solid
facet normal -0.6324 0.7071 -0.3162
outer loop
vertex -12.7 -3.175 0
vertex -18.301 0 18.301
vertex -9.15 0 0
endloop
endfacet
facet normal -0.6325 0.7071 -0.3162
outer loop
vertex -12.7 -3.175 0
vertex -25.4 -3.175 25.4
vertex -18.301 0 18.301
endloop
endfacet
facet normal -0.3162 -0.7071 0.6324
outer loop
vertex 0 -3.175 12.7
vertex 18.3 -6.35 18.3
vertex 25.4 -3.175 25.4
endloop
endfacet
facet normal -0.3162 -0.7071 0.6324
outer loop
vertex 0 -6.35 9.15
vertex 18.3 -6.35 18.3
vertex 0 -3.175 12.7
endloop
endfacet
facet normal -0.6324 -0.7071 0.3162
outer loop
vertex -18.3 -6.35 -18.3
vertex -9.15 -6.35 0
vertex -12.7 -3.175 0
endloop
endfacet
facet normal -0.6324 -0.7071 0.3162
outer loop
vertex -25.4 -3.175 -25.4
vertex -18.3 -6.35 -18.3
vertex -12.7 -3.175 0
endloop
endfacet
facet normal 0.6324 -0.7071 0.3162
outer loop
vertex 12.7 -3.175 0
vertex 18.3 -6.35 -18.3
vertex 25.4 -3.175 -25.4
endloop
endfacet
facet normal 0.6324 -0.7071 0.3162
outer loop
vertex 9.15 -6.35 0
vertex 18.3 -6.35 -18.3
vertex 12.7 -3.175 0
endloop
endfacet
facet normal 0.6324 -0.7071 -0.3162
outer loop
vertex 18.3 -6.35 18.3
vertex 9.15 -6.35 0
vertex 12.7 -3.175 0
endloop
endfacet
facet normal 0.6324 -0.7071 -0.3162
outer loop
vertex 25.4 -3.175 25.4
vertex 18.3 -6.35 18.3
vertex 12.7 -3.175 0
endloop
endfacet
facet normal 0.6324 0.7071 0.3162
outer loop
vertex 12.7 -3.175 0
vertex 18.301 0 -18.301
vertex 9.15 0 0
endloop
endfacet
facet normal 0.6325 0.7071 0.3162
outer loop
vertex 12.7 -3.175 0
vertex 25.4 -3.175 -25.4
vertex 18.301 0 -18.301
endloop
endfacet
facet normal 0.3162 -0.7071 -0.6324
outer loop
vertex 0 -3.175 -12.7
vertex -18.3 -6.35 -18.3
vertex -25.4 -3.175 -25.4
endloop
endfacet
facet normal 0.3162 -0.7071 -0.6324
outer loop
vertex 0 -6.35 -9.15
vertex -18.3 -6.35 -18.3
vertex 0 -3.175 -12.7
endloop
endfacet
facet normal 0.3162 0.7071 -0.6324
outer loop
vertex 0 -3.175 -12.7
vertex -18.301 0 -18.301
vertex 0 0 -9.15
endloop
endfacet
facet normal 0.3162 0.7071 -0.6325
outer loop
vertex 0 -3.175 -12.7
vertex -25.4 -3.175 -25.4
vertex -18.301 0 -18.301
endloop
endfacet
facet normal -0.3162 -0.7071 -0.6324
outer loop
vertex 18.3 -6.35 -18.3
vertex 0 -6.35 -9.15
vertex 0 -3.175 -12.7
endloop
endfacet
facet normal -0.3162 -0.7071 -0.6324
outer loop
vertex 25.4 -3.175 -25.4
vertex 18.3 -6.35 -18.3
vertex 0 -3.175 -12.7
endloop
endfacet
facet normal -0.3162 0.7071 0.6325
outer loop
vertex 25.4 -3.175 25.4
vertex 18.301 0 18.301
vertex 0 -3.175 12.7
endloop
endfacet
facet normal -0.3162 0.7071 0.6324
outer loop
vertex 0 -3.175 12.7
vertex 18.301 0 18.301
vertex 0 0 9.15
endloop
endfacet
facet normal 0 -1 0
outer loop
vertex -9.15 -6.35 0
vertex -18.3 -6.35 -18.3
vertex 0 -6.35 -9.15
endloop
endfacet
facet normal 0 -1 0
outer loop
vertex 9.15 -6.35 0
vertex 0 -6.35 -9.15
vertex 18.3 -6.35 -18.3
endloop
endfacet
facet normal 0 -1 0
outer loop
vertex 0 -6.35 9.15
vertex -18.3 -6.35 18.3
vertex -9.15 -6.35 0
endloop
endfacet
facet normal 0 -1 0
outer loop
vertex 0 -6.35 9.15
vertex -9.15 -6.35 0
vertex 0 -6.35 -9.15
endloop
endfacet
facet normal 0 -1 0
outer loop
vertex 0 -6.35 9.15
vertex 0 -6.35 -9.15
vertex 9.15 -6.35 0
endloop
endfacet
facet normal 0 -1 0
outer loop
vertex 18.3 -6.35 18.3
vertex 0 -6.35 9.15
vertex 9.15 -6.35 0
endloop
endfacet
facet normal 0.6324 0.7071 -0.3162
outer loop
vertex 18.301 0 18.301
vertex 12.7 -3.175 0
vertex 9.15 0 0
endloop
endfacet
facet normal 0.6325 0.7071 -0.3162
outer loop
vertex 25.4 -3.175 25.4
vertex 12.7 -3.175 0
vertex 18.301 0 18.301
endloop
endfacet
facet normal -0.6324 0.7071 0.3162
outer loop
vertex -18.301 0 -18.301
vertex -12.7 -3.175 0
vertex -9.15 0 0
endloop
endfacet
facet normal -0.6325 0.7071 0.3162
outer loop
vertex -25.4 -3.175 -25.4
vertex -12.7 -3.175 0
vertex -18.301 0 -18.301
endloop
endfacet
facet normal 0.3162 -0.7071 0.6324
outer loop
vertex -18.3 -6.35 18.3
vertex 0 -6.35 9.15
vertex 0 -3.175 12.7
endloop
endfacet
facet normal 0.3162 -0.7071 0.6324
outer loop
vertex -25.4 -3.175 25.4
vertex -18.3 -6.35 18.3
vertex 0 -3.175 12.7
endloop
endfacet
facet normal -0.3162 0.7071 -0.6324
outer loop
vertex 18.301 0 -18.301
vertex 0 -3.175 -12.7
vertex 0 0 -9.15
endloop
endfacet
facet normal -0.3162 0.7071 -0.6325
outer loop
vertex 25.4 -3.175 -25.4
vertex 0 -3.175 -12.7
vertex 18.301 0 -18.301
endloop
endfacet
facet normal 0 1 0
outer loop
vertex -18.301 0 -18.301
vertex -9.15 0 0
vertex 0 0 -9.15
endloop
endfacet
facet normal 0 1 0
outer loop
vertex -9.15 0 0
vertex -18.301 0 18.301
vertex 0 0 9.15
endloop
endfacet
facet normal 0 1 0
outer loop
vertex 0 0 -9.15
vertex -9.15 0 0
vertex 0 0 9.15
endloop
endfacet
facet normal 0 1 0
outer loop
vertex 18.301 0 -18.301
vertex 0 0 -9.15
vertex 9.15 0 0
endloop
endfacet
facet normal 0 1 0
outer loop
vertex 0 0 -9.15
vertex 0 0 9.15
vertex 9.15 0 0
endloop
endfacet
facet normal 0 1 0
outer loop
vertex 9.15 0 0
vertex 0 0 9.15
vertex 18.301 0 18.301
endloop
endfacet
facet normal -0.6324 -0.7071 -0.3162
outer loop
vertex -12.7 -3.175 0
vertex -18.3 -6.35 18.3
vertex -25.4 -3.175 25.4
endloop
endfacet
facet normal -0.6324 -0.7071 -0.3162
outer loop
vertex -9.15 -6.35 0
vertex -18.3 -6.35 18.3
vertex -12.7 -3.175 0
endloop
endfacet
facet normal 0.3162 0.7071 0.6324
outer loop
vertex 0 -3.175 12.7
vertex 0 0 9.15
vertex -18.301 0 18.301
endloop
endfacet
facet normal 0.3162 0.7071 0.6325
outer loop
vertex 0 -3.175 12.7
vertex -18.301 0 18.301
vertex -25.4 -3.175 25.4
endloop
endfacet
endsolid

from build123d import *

# Parameters (mm, degrees)
F1_DEPTH = 6.35
F2_SIZE  = 3.175
F3_SIZE  = 3.17499


# Not quite as in the source:
# - a fillet or chamfer is up to 0.001 mm smaller than in the source, because OpenCascade refuses the exact size


with BuildPart() as f1:
    # F0 (on Front) → F1 (new body)
    with BuildSketch(Plane.XZ):
        Polygon((0, 12.7), (-25.4, 25.4), (-12.7, 0), (-25.4, -25.4), (0, -12.7), (25.4, -25.4), (12.7, 0), (25.4, 25.4), align=None)
    extrude(amount=F1_DEPTH)

    # F2
    f2_edges = [f1.edges().sort_by_distance(p)[0] for p in [
        (-19.05, -6.35, 12.7),
        (-12.7, -6.35, 19.05),
        (12.7, -6.35, -19.05),
        (19.05, -6.35, -12.7),
        (19.05, -6.35, 12.7),
        (12.7, -6.35, 19.05),
        (-19.05, -6.35, -12.7),
        (-12.7, -6.35, -19.05),
    ]]
    chamfer(f2_edges, length=F2_SIZE)

    # F3 (size 3.175 in the source; OpenCascade refuses exactly that, so slightly less here)
    f3_edges = [f1.edges().sort_by_distance(p)[0] for p in [
        (-19.05, 0, -12.7),
        (-12.7, 0, -19.05),
        (12.7, 0, -19.05),
        (19.05, 0, -12.7),
        (19.05, 0, 12.7),
        (12.7, 0, 19.05),
        (-12.7, 0, 19.05),
        (-19.05, 0, 12.7),
    ]]
    chamfer(f3_edges, length=F3_SIZE)


solid = f1.part
